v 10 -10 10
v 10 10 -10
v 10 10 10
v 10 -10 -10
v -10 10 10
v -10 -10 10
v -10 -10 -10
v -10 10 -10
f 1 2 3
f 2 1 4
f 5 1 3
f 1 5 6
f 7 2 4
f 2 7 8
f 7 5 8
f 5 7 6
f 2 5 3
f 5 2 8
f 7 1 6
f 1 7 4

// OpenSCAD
// Size of the cube and pyramids
cubeSize = 20;
pyramidHeight = 10;

// Cube with pyramids
module cubeWithPyramids() {
    // Draw the central cube
    cube([cubeSize, cubeSize, cubeSize], center = true);

    // Pyramids on each face
    translate([0, 0, cubeSize / 2 + pyramidHeight / 2])
        rotate([0, 0, 0])
        pyramid();

    translate([0, 0, -cubeSize / 2 - pyramidHeight / 2])
        rotate([180, 0, 0])
        pyramid();

    translate([cubeSize / 2 + pyramidHeight / 2, 0, 0])
        rotate([0, 0, -90])
        pyramid();

    translate([-cubeSize / 2 - pyramidHeight / 2, 0, 0])
        rotate([0, 0, 90])
        pyramid();

    translate([0, cubeSize / 2 + pyramidHeight / 2, 0])
        rotate([90, 0, 0])
        pyramid();

    translate([0, -cubeSize / 2 - pyramidHeight / 2, 0])
        rotate([-90, 0, 0])
        pyramid();
}

// Pyramid module
module pyramid() {
    polyhedron(
        points = [
            [0, 0, pyramidHeight],
            [-cubeSize / 2, -cubeSize / 2, 0],
            [-cubeSize / 2, cubeSize / 2, 0],
            [cubeSize / 2, cubeSize / 2, 0],
            [cubeSize / 2, -cubeSize / 2, 0]
        ],
        faces = [
            [0, 1, 2],
            [0, 2, 3],
            [0, 3, 4],
            [0, 4, 1],
            [1, 2, 3, 4]
        ]
    );
}

// Call the module
cubeWithPyramids();
